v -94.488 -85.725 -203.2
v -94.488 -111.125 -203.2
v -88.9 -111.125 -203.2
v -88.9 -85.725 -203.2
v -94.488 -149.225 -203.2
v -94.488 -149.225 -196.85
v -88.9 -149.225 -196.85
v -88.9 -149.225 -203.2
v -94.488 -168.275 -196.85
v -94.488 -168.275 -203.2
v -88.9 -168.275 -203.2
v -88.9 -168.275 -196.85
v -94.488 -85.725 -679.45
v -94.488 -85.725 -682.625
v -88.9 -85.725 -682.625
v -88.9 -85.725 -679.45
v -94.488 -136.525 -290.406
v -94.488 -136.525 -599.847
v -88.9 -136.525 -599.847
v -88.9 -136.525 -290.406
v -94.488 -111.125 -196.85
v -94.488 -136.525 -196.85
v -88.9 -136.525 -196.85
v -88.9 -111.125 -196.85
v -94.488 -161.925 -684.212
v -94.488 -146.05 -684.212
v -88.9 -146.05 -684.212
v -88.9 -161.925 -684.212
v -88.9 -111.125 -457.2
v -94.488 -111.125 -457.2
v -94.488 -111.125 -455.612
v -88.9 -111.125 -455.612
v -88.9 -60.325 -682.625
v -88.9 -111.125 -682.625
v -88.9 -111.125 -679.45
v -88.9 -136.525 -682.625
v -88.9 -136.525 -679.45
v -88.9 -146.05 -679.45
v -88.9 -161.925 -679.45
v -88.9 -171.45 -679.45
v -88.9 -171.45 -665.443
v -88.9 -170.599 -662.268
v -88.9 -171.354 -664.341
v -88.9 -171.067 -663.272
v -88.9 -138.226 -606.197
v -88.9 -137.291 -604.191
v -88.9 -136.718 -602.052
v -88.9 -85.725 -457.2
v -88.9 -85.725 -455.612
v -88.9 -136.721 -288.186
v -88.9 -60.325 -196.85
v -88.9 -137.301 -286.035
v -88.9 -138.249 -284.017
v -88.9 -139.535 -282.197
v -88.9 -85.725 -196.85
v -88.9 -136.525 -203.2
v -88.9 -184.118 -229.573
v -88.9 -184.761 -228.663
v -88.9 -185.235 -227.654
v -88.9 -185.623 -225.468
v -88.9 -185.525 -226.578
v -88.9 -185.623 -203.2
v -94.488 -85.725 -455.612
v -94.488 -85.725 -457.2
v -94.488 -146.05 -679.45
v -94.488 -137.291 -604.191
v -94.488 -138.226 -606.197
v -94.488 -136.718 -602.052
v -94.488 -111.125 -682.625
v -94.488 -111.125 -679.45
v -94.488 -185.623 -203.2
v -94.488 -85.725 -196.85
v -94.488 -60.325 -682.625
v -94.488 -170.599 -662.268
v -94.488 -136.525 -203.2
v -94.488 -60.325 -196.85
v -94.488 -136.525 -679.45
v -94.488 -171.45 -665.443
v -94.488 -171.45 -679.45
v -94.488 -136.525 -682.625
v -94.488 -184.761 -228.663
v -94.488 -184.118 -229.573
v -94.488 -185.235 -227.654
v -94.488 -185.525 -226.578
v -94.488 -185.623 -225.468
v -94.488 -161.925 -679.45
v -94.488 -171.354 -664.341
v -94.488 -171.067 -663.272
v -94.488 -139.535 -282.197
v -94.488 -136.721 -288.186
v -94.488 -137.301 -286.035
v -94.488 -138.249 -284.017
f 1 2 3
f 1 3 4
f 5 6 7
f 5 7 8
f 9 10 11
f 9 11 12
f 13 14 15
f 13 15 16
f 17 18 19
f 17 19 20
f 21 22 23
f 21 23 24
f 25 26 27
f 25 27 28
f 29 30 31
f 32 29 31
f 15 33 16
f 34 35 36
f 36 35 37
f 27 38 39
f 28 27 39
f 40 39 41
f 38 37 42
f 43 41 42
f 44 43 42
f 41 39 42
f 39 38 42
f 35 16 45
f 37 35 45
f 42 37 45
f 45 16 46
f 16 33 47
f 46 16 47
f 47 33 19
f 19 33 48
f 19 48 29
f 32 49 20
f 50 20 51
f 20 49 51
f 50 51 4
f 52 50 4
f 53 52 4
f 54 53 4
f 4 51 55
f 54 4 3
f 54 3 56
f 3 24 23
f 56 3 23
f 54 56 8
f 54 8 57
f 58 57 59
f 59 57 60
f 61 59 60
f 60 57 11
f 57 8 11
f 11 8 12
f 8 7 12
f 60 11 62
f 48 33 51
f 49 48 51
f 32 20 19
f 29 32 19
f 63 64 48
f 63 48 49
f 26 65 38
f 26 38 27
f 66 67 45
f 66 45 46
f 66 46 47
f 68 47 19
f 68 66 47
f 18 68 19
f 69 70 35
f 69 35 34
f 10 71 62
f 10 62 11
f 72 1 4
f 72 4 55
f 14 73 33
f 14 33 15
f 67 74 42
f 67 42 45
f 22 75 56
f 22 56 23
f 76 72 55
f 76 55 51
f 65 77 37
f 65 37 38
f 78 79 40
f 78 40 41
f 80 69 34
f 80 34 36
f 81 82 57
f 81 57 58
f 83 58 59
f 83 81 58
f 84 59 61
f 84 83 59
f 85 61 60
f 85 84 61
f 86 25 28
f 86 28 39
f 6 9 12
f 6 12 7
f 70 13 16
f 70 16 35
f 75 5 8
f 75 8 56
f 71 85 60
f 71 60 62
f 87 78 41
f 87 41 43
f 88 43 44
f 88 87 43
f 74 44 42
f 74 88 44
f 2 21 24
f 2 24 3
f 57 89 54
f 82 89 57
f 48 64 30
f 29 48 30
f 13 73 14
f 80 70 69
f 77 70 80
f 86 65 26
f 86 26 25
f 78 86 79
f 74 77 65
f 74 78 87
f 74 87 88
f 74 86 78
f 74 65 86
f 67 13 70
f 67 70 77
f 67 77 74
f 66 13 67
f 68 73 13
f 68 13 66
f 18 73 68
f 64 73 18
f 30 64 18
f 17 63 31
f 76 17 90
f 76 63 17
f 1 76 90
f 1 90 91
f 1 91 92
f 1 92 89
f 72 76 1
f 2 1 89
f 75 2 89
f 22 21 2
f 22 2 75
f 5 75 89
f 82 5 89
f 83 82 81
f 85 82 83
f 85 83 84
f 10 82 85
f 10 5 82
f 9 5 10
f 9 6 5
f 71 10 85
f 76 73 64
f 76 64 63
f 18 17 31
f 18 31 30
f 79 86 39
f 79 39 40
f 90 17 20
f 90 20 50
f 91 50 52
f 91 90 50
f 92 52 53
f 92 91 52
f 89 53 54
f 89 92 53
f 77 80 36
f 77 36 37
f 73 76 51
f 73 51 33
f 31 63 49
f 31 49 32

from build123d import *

# Parameters (mm, degrees)
SKETCH1_W           = 25.4
SKETCH1_H           = 1.5875
BOSS_EXTRUDE1_DEPTH = 5.588


with BuildPart() as part:
    # Sketch1 → Boss-Extrude1 (new body)
    # profile 1 of 3: a face of its own
    with BuildSketch(Plane(origin=(-94.488, 0, 0), x_dir=(0, -1, 0), z_dir=(-1, 0, 0))):
        Polygon((136.525, -196.85), (111.125, -196.85), (111.125, -203.2), (85.725, -203.2), (85.725, -196.85), (60.325, -196.85), (60.325, -682.625), (85.725, -682.625), (85.725, -679.45), (111.125, -679.45), (111.125, -682.625), (136.525, -682.625), align=None)
        with Locations((98.425, -456.40625)):
            Rectangle(SKETCH1_W, SKETCH1_H, mode=Mode.SUBTRACT)
    # profile 2 of 3: a face of its own
    with BuildSketch(Plane(origin=(-94.488, 0, 0), x_dir=(0, -1, 0), z_dir=(-1, 0, 0))):
        with BuildLine():
            Line((149.225, -203.2), (136.525, -203.2))
            Line((136.525, -203.2), (136.525, -290.406498707))
            ThreePointArc((136.525, -290.406498707), (137.30121982, -286.034603668), (139.534994681, -282.197126202))
            Line((139.534994681, -282.197126202), (184.118202659, -229.57294303))
            ThreePointArc((184.118202659, -229.57294303), (185.23509009, -227.654204297), (185.6232, -225.468256778))
            Line((185.6232, -225.468256778), (185.6232, -203.2))
            Line((185.6232, -203.2), (168.275, -203.2))
            Line((168.275, -203.2), (168.275, -196.85))
            Line((168.275, -196.85), (149.225, -196.85))
            Line((149.225, -196.85), (149.225, -203.2))
        make_face()
    # profile 3 of 3: a face of its own
    with BuildSketch(Plane(origin=(-94.488, 0, 0), x_dir=(0, -1, 0), z_dir=(-1, 0, 0))):
        with BuildLine():
            ThreePointArc((138.226477372, -606.197045256), (136.957742006, -603.134047129), (136.525, -599.847045256))
            Line((136.525, -599.847045256), (136.525, -679.45))
            Line((136.525, -679.45), (146.05, -679.45))
            Line((146.05, -679.45), (146.05, -684.2125))
            Line((146.05, -684.2125), (161.925, -684.2125))
            Line((161.925, -684.2125), (161.925, -679.45))
            Line((161.925, -679.45), (171.45, -679.45))
            Line((171.45, -679.45), (171.45, -665.443351826))
            ThreePointArc((171.45, -665.443351826), (171.233628997, -663.79985089), (170.599261314, -662.268351826))
            Line((170.599261314, -662.268351826), (138.226477372, -606.197045256))
        make_face()
    extrude(amount=-BOSS_EXTRUDE1_DEPTH)


solid = part.part
